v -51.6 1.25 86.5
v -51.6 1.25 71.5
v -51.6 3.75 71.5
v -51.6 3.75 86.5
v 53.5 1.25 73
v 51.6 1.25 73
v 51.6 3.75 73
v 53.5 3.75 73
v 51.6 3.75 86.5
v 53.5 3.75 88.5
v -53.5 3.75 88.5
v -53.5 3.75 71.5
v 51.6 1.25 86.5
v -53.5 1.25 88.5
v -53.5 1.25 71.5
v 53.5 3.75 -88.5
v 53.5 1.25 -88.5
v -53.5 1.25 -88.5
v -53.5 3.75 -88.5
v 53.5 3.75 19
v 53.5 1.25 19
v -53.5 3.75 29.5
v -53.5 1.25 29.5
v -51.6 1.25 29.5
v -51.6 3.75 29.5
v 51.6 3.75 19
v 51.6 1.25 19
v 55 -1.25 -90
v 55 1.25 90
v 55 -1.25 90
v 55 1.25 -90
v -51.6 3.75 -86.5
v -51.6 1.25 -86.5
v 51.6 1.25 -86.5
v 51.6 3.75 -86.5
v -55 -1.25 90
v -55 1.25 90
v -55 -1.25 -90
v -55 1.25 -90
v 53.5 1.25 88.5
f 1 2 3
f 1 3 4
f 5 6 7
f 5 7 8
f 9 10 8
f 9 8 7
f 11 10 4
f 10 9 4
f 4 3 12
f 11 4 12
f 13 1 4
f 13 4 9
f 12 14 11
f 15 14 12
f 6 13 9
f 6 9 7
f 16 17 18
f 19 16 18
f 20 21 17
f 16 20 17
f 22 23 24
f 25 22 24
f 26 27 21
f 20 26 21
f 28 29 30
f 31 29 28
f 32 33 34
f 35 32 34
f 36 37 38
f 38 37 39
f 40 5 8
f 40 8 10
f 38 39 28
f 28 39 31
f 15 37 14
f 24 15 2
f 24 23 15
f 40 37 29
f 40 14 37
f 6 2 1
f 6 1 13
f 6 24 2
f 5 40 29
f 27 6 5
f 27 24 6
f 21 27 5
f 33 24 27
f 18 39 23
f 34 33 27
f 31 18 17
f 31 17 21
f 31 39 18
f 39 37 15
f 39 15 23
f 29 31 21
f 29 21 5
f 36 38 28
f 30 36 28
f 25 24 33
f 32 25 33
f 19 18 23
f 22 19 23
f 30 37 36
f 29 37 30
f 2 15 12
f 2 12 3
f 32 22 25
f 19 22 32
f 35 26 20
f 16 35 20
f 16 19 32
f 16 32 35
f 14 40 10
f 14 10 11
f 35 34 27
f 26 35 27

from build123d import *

# Parameters (mm, degrees)
SKETCH1_W           = 110
SKETCH1_H           = 180
BOSS_EXTRUDE1_DEPTH = 1.25
BOSS_EXTRUDE3_DEPTH = 2.5


with BuildPart() as part:
    # Sketch1 → Boss-Extrude1 (new, symmetric)
    with BuildSketch(Plane(origin=(0, 0, 0), x_dir=(1, 0, 0), z_dir=(0, 1, 0))):
        Rectangle(SKETCH1_W, SKETCH1_H)
    extrude(amount=BOSS_EXTRUDE1_DEPTH, both=True)

    # Sketch2 → Boss-Extrude3 (add)
    with BuildSketch(Plane(origin=(0, 1.25, 0), x_dir=(1, 0, 0), z_dir=(0, 1, 0))):
        Polygon((53.5, -88.5), (-53.5, -88.5), (-53.5, -71.5), (-51.6, -71.5), (-51.6, -86.5), (51.6, -86.5), (51.6, -73), (53.5, -73), align=None)
        Polygon((53.5, 88.5), (-53.5, 88.5), (-53.5, -29.5), (-51.6, -29.5), (-51.6, 86.5), (51.6, 86.5), (51.6, -19), (53.5, -19), align=None)
    extrude(amount=BOSS_EXTRUDE3_DEPTH)


solid = part.part
